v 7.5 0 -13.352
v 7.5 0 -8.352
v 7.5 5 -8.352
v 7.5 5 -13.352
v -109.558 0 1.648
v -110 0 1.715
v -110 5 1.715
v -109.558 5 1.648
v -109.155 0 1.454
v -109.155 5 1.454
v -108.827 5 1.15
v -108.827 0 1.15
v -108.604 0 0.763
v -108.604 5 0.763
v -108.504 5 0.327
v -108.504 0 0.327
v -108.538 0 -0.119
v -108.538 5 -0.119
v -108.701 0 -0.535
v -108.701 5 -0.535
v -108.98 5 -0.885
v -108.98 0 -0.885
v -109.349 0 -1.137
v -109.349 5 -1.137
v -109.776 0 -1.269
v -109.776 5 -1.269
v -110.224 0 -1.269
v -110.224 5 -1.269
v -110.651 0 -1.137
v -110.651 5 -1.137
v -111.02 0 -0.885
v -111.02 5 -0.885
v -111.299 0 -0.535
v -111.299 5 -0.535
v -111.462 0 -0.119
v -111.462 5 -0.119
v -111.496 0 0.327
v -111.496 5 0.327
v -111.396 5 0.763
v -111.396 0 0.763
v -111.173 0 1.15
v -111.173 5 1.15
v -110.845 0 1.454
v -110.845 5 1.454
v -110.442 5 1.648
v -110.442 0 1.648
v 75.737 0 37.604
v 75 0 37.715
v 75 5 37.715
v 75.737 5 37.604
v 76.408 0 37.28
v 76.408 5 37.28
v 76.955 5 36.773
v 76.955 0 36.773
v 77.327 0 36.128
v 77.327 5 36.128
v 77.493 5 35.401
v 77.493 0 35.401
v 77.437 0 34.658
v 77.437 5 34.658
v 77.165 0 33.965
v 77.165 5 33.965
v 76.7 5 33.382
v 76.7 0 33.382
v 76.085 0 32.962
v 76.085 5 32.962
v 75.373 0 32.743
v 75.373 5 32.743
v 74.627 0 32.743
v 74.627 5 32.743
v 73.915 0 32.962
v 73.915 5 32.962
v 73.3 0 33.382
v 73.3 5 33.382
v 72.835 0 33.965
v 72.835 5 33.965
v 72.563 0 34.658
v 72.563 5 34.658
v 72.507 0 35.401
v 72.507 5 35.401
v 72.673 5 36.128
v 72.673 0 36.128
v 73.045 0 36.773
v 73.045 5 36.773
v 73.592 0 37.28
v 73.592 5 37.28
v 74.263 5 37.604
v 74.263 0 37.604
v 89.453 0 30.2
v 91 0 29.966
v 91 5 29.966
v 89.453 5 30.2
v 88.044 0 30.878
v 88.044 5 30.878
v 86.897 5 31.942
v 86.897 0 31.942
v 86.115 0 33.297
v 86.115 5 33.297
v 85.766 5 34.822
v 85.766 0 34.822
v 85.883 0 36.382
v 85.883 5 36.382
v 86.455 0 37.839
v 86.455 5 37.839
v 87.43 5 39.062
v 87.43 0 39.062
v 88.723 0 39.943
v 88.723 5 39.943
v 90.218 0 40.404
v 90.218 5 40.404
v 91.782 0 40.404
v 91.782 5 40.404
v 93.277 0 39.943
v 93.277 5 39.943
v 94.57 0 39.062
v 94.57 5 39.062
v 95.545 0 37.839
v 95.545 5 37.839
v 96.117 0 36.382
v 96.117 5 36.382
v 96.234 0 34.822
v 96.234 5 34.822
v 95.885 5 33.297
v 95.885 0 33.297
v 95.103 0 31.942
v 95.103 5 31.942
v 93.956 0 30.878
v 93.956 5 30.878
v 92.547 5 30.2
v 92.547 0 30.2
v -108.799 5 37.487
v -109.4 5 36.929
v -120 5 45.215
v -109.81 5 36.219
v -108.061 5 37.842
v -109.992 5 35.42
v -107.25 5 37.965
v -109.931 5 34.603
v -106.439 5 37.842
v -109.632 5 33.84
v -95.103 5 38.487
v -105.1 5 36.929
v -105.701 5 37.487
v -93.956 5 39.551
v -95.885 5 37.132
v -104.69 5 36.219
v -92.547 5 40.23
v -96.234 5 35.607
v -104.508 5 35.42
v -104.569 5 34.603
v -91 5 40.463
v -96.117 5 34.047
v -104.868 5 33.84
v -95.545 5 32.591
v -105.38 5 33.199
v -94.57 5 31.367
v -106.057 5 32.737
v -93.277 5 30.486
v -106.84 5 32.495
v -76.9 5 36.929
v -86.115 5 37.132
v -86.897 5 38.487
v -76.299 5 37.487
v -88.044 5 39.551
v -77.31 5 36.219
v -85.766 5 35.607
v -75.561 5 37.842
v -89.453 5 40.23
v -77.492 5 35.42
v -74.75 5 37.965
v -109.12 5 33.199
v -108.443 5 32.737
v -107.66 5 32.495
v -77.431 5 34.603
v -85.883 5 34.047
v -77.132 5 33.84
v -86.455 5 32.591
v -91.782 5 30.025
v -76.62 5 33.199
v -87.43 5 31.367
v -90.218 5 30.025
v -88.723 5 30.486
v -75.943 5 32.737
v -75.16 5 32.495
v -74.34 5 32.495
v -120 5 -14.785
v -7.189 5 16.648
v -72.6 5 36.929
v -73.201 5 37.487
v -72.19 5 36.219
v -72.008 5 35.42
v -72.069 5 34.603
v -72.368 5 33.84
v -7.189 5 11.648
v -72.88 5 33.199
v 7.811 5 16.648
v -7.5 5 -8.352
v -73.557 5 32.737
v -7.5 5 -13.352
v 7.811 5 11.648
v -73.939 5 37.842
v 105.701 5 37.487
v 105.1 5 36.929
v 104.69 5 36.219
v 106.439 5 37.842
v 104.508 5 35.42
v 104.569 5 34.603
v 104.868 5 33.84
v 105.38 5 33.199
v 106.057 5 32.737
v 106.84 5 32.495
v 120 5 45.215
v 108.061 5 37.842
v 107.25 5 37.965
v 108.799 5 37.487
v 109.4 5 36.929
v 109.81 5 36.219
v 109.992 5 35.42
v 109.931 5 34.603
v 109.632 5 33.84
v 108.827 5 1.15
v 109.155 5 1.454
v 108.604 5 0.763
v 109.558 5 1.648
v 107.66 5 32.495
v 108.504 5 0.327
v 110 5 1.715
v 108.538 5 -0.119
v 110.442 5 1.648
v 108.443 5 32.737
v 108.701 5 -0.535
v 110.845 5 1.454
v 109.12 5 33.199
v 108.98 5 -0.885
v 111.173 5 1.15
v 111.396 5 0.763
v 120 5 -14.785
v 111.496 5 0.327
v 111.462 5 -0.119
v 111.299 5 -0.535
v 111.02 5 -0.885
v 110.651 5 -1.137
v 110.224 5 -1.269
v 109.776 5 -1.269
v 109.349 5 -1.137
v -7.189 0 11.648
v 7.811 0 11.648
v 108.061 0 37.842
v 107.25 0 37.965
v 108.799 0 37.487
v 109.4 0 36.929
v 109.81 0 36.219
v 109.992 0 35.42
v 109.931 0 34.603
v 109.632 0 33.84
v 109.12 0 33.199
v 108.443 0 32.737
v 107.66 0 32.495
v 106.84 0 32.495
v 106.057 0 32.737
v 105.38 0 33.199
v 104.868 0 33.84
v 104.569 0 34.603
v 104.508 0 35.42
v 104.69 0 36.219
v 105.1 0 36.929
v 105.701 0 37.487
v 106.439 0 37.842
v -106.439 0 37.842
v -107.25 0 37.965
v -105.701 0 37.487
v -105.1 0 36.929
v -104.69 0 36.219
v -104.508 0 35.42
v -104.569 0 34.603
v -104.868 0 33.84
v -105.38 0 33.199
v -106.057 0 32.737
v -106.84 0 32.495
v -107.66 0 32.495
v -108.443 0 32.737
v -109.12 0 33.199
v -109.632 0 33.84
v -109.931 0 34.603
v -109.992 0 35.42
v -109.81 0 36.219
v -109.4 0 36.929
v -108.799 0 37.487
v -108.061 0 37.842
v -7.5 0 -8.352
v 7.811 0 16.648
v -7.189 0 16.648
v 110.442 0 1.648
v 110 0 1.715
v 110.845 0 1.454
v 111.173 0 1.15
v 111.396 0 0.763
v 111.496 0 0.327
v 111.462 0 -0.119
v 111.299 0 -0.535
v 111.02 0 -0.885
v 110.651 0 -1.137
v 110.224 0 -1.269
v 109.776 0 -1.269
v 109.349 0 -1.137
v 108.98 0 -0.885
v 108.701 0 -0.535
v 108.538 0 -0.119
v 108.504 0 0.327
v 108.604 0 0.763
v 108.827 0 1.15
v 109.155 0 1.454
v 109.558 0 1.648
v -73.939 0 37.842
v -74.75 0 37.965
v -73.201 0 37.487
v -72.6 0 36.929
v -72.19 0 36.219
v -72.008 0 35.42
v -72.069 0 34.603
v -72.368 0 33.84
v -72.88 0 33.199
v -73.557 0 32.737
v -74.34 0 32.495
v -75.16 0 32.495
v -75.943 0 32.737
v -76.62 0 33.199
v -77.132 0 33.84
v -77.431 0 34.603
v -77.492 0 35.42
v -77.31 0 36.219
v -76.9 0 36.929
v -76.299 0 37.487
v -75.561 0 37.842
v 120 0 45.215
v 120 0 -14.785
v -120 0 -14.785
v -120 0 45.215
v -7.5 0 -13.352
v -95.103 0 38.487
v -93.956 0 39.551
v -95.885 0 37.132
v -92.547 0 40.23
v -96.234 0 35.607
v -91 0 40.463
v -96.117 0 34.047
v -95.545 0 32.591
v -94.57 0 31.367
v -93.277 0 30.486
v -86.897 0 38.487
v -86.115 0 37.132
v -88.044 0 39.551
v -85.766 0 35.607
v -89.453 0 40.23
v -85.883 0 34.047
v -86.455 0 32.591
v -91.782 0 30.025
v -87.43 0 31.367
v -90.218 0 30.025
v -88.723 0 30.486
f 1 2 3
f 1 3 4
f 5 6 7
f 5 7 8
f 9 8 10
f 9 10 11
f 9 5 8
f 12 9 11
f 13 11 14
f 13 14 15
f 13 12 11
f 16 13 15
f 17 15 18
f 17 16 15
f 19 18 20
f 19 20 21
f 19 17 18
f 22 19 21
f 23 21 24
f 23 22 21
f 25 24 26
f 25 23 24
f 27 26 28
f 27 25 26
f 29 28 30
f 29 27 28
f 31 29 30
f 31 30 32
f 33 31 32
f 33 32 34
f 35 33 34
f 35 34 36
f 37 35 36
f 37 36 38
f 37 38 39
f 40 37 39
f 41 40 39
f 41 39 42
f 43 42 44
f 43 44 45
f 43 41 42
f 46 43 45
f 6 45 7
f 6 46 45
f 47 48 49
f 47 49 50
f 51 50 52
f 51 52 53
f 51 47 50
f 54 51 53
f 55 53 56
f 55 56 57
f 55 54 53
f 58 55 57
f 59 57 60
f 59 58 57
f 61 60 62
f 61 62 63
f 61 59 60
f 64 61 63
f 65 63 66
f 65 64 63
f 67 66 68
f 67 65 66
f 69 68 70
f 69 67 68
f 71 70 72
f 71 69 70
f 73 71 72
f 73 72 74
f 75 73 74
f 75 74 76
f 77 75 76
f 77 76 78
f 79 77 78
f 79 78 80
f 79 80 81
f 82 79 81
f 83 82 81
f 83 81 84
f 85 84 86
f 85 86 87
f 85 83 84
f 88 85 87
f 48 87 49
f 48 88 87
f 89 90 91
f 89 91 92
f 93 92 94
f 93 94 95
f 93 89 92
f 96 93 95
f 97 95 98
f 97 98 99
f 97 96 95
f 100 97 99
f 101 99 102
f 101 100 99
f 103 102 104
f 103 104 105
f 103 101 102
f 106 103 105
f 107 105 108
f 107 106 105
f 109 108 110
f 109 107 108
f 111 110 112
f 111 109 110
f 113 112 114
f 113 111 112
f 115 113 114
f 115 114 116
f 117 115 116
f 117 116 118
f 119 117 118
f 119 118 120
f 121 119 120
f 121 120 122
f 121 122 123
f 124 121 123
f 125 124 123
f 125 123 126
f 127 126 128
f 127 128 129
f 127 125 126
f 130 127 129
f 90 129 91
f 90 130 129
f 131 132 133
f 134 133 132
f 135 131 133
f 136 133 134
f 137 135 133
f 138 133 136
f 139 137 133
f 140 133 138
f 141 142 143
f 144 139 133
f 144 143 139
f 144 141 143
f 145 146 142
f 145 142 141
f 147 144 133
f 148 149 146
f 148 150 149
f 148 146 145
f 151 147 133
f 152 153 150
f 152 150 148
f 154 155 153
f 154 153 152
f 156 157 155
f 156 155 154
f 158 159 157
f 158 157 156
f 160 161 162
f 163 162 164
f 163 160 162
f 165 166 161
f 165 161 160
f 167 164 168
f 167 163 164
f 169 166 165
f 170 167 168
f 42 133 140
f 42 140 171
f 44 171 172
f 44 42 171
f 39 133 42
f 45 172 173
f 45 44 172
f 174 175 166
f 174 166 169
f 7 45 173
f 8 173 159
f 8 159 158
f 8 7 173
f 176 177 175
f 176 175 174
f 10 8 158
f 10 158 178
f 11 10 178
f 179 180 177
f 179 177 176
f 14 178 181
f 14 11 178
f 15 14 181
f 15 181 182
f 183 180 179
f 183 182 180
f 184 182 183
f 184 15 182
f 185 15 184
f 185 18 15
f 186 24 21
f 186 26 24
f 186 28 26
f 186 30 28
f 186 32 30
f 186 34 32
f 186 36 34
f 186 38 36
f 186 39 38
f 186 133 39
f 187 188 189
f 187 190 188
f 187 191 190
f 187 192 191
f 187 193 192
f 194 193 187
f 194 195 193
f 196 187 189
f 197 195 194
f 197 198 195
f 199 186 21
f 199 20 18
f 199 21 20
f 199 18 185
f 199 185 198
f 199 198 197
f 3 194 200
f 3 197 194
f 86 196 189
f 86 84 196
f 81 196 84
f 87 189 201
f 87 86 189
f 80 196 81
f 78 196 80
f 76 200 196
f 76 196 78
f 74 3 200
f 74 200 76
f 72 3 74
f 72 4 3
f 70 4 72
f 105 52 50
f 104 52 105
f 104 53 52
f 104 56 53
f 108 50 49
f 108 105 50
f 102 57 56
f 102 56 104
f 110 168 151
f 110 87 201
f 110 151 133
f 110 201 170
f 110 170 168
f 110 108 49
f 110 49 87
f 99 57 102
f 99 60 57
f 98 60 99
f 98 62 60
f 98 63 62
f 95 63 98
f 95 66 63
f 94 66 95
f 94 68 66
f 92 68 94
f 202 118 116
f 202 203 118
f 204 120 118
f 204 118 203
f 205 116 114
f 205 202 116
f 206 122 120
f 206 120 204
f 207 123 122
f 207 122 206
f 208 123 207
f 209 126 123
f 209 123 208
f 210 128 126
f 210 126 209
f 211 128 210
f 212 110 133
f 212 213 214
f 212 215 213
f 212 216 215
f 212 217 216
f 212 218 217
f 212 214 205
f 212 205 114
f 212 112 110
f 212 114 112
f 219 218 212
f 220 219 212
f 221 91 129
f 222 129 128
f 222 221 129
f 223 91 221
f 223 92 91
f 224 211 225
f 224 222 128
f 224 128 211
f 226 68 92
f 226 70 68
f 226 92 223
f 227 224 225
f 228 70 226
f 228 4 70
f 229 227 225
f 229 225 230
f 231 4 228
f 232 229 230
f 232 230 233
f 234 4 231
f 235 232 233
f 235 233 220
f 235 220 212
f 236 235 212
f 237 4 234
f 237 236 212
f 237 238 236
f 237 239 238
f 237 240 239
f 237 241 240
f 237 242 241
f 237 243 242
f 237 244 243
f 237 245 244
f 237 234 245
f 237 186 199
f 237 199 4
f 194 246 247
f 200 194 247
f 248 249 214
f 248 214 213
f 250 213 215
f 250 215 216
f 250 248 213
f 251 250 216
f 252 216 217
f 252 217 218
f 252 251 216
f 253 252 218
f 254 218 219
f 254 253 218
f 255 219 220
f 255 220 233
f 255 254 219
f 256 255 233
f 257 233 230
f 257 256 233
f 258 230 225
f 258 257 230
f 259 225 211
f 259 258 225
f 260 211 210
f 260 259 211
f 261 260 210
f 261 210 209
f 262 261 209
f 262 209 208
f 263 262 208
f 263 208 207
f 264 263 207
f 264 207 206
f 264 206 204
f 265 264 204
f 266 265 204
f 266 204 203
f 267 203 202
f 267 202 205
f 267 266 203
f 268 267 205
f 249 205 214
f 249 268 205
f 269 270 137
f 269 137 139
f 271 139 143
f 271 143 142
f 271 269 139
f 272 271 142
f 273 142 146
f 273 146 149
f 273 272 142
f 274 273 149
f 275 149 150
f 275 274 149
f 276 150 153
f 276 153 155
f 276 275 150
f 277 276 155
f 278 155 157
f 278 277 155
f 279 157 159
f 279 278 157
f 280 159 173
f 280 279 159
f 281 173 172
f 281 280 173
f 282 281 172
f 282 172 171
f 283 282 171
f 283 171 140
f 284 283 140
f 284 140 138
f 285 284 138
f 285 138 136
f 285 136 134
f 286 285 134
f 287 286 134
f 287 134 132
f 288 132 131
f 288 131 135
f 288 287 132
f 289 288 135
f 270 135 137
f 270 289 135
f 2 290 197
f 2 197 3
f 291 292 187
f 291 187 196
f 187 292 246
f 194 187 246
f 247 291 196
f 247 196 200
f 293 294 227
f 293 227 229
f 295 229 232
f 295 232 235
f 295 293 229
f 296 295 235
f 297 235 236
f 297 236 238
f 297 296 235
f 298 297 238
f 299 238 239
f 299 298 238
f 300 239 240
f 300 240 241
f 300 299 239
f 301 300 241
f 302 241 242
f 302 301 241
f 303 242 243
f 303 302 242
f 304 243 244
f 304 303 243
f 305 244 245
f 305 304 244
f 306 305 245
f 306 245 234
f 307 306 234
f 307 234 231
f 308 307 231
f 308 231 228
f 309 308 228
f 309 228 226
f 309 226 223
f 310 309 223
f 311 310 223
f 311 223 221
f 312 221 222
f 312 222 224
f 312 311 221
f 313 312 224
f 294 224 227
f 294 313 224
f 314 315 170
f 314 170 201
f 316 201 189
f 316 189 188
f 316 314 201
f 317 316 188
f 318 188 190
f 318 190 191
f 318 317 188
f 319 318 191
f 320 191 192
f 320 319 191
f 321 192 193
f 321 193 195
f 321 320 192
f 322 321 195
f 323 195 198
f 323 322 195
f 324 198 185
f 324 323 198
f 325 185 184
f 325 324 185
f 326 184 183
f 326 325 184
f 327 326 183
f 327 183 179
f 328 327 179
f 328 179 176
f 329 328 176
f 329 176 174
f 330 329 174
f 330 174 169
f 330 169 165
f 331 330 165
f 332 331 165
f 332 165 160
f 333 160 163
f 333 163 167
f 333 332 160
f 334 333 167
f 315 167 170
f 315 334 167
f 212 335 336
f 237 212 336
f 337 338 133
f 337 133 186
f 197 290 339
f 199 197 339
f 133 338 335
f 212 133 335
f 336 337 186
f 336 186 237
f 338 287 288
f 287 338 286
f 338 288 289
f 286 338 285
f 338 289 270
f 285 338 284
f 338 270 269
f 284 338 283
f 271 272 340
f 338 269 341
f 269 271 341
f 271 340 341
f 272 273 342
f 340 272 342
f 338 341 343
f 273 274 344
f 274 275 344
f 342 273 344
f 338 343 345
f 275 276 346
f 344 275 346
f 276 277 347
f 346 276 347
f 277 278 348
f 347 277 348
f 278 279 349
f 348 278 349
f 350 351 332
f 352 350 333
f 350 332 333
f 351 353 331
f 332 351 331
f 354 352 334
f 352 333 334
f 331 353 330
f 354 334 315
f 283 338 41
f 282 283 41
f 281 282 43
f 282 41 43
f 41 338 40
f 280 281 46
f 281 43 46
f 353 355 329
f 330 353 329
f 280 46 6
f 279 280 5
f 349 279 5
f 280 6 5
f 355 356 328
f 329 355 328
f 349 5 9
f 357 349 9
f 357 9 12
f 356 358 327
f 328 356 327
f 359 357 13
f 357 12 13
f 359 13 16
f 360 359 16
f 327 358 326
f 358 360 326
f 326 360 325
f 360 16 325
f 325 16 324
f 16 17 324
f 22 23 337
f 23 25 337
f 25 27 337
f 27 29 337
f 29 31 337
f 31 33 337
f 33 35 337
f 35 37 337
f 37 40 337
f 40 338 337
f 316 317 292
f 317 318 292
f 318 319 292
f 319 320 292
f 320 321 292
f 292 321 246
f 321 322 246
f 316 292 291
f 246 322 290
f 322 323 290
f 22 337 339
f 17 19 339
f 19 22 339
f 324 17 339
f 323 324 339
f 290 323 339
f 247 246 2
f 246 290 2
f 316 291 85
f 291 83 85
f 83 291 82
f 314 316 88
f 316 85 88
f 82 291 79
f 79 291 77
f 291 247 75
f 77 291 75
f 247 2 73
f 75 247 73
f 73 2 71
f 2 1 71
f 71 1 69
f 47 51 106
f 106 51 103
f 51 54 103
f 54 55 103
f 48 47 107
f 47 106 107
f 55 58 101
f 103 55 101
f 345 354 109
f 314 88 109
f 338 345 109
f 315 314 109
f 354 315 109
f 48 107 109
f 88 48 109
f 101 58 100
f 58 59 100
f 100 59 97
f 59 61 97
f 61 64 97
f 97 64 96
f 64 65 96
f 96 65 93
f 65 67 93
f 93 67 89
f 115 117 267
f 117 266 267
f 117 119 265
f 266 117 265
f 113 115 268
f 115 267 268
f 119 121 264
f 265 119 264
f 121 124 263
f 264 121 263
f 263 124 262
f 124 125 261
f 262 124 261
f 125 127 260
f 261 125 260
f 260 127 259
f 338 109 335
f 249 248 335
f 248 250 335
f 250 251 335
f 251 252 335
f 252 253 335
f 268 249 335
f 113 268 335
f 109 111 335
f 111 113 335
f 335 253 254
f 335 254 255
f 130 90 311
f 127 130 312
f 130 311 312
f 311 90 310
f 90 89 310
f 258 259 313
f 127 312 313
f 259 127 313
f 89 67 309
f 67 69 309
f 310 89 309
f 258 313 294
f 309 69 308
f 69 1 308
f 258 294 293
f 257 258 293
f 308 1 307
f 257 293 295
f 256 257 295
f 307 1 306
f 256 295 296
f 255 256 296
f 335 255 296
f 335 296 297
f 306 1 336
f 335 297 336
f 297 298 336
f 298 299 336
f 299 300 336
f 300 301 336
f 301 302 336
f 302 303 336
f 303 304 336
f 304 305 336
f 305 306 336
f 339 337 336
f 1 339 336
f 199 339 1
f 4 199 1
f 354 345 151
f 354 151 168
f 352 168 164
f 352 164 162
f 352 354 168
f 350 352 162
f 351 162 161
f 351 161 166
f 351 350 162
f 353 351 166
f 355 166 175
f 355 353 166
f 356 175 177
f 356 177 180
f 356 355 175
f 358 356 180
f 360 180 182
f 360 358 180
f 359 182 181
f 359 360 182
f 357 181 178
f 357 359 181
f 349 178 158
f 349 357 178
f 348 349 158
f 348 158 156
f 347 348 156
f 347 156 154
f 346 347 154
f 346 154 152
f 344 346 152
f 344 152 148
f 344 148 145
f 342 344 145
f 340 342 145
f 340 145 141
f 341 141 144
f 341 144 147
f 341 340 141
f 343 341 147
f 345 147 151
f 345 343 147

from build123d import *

# Parameters (mm, degrees)
SKETCH1_W           = 240
SKETCH1_H           = 60
SKETCH1_R           = 5.248248104
SKETCH1_R_2         = 1.5
SKETCH1_R_3         = 2.75
SKETCH1_R_4         = 2.5
SKETCH1_W_2         = 15
SKETCH1_H_2         = 5
BOSS_EXTRUDE1_DEPTH = 5


with BuildPart() as part:
    # Sketch1 → Boss-Extrude1 (new body)
    with BuildSketch(Plane(origin=(0, 0, 0), x_dir=(1, 0, 0), z_dir=(0, 1, 0))):
        with Locations((0, -15.214636322)):
            Rectangle(SKETCH1_W, SKETCH1_H)
        with Locations(Location((-91, -35.214636322, 0), (0, 0, 270))):
            Circle(SKETCH1_R, mode=Mode.SUBTRACT)
        with Locations(Location((91, -35.214636322, 0), (0, 0, 90))):
            Circle(SKETCH1_R, mode=Mode.SUBTRACT)
        with Locations(Location((-110, -0.214636322, 0), (0, 0, 270))):
            Circle(SKETCH1_R_2, mode=Mode.SUBTRACT)
        with Locations(Location((110, -0.214636322, 0), (0, 0, 270))):
            Circle(SKETCH1_R_2, mode=Mode.SUBTRACT)
        with Locations(Location((-74.75, -35.214636322, 0), (0, 0, 270))):
            Circle(SKETCH1_R_3, mode=Mode.SUBTRACT)
        with Locations(Location((-107.25, -35.214636322, 0), (0, 0, 270))):
            Circle(SKETCH1_R_3, mode=Mode.SUBTRACT)
        with Locations(Location((107.25, -35.214636322, 0), (0, 0, 270))):
            Circle(SKETCH1_R_3, mode=Mode.SUBTRACT)
        with Locations(Location((75, -35.214636322, 0), (0, 0, 270))):
            Circle(SKETCH1_R_4, mode=Mode.SUBTRACT)
        with Locations((0.310691637, -14.147905604)):
            Rectangle(SKETCH1_W_2, SKETCH1_H_2, mode=Mode.SUBTRACT)
        with Locations((0, 10.852094396)):
            Rectangle(SKETCH1_W_2, SKETCH1_H_2, mode=Mode.SUBTRACT)
    extrude(amount=BOSS_EXTRUDE1_DEPTH)


solid = part.part
